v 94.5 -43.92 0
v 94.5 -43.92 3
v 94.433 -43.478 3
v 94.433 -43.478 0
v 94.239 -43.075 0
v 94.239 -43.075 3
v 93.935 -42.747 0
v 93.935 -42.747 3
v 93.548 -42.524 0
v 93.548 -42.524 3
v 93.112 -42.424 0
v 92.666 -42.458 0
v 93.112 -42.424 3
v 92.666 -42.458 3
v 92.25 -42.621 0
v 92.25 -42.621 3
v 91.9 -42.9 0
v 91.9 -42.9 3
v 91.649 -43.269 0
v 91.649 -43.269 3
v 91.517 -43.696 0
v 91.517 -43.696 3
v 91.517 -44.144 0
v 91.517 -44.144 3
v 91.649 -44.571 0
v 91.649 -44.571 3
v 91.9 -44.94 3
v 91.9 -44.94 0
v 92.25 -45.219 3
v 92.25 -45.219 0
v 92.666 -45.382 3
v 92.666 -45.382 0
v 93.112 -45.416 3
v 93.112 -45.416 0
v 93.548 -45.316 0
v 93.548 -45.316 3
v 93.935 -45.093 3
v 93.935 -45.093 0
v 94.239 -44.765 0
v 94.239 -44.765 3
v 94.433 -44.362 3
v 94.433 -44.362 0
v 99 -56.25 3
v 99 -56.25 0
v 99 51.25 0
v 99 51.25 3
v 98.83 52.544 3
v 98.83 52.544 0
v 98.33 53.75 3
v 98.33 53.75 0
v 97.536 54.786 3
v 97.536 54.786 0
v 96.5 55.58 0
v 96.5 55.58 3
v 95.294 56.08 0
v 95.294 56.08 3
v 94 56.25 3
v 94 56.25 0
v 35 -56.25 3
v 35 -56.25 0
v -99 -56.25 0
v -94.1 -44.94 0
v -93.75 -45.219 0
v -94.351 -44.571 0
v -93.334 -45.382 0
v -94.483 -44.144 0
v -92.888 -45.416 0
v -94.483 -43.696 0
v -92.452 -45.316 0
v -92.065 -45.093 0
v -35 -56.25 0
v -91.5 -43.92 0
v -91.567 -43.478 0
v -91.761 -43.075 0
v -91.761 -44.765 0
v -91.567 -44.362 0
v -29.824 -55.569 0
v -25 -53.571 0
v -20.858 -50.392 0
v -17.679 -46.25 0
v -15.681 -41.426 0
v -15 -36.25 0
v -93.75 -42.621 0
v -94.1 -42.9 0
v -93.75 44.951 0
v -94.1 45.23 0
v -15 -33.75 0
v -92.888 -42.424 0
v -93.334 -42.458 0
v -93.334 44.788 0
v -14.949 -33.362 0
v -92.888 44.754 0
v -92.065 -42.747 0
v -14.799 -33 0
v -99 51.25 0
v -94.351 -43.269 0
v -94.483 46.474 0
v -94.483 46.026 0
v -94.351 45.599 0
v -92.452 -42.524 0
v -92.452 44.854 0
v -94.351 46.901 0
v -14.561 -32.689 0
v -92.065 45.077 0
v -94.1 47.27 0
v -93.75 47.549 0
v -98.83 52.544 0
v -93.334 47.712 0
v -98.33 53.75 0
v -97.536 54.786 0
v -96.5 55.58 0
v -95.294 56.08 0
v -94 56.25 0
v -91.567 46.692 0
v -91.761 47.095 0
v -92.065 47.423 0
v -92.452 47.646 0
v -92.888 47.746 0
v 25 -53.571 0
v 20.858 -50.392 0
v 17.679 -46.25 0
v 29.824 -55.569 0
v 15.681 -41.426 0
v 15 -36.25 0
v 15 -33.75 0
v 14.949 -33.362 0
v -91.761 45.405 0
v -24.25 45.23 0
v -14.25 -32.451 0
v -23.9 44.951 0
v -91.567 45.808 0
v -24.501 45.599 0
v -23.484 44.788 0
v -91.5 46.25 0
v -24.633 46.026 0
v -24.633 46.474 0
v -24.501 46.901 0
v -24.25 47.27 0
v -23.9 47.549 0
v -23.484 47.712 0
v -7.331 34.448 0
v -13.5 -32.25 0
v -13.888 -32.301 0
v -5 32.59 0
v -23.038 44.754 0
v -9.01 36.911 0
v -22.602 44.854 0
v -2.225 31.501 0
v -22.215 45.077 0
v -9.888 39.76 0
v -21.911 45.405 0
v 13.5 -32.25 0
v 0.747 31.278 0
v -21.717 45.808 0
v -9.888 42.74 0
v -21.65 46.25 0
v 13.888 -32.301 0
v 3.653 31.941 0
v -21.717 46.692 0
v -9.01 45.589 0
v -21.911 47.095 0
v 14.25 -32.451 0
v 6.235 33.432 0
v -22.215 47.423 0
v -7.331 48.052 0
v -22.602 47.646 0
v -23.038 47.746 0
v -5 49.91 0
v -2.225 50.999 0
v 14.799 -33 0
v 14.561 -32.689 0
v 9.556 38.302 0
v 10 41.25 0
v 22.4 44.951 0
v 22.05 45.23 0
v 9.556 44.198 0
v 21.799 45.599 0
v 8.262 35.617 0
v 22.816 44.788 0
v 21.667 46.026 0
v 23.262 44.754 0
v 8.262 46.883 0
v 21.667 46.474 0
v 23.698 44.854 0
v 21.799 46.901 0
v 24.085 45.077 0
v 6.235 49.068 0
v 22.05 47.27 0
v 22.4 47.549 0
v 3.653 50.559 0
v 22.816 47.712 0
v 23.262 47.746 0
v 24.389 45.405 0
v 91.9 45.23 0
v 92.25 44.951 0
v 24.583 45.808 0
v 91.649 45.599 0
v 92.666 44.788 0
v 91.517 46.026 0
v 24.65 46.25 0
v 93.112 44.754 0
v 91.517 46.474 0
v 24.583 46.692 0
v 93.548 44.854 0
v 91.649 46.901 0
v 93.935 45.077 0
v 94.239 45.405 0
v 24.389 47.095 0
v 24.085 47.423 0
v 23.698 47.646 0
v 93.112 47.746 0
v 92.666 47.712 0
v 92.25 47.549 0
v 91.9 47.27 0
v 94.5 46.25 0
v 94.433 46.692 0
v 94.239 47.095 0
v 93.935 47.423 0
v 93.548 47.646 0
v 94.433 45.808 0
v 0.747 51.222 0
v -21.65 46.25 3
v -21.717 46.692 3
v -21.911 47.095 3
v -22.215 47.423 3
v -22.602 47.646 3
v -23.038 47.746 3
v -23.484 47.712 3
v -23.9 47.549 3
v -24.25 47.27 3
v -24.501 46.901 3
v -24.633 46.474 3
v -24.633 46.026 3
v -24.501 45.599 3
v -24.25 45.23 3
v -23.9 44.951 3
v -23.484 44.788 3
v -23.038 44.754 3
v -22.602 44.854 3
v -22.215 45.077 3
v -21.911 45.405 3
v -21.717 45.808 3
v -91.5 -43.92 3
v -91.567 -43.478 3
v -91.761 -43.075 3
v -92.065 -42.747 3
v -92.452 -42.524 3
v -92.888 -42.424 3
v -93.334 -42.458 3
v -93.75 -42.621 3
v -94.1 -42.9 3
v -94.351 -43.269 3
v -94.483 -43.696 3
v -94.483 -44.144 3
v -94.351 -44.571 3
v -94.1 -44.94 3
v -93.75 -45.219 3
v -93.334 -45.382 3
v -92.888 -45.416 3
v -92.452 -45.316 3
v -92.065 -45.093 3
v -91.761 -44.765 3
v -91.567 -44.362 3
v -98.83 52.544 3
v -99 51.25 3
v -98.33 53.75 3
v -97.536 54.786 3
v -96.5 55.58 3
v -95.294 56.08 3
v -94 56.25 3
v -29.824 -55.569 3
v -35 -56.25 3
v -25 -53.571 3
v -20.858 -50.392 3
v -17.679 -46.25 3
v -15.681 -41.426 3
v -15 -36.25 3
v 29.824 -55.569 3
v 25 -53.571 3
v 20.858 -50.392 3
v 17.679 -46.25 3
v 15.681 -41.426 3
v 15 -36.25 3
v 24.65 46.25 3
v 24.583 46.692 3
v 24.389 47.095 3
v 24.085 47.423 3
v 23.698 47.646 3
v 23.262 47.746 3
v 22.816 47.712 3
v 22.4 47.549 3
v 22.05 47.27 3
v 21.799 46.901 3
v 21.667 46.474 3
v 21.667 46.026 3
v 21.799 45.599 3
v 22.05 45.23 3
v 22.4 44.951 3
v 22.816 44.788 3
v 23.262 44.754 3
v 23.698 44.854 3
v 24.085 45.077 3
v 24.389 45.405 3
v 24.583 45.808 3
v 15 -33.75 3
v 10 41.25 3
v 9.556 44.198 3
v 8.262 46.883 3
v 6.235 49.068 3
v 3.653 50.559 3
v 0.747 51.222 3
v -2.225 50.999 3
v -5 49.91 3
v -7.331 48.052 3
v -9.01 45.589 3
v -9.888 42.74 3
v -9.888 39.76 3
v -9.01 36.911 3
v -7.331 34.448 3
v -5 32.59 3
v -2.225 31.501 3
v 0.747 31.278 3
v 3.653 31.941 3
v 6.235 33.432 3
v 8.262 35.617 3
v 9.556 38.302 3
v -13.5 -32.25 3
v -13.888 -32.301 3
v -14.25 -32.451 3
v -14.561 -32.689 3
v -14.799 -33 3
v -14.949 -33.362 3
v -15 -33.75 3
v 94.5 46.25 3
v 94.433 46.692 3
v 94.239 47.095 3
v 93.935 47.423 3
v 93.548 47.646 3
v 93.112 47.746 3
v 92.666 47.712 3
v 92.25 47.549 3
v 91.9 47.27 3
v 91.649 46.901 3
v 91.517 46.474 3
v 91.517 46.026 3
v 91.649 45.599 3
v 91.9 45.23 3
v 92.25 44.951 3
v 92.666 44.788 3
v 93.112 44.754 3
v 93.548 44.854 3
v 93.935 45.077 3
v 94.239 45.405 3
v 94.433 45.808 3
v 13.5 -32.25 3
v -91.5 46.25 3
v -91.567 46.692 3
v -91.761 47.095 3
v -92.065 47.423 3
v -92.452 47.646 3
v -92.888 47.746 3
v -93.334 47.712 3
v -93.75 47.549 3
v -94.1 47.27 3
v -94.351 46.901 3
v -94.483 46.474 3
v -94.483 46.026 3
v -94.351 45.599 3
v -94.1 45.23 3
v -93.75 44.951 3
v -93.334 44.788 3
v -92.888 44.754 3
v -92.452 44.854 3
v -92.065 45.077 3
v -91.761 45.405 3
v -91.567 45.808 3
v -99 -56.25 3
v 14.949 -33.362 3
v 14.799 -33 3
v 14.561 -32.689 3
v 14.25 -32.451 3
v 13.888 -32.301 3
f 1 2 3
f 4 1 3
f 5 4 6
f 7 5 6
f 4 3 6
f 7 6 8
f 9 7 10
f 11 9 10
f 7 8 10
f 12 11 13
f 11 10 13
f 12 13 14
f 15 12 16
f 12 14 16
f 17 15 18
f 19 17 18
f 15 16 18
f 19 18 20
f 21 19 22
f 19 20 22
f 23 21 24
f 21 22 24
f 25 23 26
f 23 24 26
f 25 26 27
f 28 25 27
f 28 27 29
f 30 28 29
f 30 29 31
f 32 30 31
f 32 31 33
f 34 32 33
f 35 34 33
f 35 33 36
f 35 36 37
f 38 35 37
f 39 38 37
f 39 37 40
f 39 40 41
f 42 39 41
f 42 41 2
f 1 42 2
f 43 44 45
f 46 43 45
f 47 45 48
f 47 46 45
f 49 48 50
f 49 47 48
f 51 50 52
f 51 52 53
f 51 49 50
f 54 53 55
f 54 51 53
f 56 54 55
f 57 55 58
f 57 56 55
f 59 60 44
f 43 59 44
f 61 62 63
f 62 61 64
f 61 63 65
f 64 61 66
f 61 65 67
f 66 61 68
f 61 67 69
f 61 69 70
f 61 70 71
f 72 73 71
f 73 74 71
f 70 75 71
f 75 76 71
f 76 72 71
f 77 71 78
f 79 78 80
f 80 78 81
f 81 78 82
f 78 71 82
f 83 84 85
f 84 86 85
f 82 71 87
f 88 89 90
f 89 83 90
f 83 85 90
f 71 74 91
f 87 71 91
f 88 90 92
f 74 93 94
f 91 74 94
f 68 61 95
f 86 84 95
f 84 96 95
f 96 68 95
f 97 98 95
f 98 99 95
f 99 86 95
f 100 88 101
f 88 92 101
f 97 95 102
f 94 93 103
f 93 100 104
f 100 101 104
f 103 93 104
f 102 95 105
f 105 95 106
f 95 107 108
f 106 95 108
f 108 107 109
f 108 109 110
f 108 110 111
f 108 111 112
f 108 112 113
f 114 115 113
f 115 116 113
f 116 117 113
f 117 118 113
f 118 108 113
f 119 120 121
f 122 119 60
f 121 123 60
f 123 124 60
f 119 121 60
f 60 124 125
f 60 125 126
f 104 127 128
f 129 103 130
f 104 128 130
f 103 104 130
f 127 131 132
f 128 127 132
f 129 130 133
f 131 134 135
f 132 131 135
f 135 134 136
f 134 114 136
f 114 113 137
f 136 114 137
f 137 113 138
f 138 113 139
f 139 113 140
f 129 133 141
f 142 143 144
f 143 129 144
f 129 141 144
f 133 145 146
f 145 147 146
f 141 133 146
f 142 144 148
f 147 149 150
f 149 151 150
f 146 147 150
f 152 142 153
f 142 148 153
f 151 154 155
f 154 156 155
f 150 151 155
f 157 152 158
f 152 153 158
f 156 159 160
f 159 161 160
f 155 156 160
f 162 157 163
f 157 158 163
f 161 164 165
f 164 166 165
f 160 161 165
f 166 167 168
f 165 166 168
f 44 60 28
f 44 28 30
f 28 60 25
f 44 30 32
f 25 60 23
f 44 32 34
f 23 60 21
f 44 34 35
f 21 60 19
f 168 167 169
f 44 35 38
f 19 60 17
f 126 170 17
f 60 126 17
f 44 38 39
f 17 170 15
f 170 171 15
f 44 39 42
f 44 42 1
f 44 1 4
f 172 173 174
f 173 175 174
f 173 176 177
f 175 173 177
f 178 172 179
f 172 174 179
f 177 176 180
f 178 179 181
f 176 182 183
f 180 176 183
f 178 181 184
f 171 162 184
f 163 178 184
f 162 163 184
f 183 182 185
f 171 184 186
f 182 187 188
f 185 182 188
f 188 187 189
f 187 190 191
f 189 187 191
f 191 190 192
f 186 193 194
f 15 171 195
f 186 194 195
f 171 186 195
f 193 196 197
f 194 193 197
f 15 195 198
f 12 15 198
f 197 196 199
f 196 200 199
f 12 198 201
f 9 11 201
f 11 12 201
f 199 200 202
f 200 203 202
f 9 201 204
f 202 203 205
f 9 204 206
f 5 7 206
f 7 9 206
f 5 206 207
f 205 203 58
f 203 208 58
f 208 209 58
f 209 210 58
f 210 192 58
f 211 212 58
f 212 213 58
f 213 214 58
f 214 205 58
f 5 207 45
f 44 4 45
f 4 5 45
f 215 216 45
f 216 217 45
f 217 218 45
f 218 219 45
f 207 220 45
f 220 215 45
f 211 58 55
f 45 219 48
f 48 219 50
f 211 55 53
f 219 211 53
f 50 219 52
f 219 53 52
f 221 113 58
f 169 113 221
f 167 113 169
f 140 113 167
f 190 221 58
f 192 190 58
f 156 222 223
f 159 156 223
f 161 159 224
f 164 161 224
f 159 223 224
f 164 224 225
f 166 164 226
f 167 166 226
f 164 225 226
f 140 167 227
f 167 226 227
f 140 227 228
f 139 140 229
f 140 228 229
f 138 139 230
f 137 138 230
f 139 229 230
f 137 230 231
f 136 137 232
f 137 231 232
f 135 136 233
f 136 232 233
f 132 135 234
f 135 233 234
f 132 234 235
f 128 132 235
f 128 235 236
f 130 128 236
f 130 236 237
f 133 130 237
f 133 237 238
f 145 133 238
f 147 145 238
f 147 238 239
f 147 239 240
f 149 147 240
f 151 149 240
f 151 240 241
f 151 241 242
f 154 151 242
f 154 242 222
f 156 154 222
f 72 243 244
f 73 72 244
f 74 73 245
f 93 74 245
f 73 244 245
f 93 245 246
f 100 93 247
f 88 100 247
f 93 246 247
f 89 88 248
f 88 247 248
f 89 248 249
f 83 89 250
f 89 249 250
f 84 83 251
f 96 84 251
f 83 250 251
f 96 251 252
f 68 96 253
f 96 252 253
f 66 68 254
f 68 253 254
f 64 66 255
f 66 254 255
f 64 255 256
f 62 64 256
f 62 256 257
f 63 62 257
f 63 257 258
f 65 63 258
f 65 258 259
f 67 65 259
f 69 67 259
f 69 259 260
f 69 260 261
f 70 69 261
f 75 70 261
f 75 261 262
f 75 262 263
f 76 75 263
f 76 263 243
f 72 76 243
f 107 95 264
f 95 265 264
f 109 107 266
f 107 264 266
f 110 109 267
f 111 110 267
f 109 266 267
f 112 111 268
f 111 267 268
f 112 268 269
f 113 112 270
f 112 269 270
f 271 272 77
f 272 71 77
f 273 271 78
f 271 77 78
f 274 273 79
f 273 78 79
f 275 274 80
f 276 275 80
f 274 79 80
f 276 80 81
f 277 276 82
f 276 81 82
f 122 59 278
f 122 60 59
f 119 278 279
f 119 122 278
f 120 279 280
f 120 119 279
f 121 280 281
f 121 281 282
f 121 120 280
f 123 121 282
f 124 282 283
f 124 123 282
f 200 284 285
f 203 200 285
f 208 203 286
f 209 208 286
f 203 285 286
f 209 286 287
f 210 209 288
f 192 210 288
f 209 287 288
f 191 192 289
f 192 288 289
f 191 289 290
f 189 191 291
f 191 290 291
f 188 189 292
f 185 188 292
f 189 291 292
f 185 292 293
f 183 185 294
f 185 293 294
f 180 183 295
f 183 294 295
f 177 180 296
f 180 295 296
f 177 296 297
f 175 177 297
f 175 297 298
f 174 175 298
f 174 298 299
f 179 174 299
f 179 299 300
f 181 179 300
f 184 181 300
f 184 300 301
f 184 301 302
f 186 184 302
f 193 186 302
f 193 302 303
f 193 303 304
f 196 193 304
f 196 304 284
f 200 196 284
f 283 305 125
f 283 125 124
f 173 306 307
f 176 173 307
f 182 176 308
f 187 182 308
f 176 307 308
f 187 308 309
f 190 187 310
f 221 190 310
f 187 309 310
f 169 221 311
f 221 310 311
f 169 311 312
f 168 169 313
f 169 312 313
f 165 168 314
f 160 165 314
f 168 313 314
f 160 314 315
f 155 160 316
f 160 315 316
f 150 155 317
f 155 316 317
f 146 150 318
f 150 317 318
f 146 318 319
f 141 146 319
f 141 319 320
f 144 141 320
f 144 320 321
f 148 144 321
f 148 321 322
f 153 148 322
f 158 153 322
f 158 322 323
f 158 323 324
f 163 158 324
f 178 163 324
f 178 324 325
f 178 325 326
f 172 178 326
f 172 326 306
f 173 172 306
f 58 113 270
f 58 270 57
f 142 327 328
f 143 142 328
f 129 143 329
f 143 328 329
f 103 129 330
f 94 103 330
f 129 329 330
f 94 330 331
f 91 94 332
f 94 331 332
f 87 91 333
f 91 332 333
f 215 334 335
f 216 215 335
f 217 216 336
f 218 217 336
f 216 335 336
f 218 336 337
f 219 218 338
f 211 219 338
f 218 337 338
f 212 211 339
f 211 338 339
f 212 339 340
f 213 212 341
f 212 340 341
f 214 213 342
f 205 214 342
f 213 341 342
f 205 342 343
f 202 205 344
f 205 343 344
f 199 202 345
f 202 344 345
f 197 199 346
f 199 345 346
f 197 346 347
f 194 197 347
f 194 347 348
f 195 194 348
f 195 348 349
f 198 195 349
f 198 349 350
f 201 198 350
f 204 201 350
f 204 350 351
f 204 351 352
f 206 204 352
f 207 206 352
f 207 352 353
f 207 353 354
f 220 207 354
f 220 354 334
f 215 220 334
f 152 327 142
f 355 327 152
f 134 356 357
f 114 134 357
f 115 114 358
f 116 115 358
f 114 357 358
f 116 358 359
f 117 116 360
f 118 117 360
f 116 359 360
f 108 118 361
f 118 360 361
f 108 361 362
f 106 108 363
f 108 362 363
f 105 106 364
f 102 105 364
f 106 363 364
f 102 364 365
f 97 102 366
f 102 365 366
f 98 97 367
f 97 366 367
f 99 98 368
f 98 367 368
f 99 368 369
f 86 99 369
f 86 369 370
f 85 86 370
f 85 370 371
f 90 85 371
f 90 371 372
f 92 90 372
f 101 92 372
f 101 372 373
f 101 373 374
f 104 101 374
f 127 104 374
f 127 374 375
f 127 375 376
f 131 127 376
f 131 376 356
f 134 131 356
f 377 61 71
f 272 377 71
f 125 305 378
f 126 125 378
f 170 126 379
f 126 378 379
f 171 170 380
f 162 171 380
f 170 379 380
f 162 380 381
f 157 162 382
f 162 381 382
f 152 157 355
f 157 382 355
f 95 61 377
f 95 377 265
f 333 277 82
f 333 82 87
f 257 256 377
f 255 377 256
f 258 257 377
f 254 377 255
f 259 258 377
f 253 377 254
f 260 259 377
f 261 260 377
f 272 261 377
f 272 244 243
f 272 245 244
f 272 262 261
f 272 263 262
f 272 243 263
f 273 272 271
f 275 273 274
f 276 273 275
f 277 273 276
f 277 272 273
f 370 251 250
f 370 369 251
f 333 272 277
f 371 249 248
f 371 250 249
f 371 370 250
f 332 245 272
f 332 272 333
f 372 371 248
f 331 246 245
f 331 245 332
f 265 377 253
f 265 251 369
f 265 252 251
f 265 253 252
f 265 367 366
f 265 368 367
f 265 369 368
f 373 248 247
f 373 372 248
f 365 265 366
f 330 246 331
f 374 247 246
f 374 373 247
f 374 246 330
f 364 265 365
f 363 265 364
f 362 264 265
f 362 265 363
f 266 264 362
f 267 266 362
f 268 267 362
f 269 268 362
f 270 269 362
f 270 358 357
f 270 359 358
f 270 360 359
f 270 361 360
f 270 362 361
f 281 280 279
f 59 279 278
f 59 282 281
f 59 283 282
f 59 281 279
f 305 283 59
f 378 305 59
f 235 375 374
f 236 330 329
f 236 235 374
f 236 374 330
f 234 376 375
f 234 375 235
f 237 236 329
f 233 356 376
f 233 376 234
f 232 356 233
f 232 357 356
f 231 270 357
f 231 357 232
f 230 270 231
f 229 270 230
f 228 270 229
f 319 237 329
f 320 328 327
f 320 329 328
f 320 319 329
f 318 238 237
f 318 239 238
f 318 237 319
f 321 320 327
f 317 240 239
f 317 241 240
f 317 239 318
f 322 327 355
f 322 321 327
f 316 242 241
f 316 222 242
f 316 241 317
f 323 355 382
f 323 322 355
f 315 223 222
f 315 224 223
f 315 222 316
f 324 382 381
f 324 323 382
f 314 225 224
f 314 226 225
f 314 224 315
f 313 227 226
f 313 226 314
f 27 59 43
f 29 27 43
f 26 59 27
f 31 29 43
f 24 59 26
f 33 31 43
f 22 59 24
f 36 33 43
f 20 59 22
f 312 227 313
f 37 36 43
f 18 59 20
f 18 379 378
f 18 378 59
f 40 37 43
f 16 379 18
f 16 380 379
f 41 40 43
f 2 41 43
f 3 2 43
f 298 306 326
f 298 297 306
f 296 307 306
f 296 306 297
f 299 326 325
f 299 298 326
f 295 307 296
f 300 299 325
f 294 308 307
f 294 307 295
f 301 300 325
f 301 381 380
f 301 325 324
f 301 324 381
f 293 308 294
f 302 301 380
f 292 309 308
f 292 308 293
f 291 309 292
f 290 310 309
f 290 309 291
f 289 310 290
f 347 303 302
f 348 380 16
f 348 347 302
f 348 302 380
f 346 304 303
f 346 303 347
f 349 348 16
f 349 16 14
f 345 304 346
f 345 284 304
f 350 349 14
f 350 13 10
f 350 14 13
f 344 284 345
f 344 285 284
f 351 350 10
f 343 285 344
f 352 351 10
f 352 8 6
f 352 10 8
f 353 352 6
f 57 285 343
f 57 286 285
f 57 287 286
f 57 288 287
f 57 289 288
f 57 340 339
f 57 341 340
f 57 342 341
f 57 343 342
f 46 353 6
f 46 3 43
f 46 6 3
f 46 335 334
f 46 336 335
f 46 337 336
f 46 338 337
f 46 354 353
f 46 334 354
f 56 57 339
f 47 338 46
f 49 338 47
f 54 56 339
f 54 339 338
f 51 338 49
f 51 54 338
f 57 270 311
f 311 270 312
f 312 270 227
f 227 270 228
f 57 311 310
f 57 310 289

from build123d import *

# Parameters (mm, degrees)
SKETCH_W      = 198
SKETCH_H      = 112.5
PAD_DEPTH     = 3
FILLET_R      = 5
SKETCH001_R   = 1.5
SKETCH001_R_2 = 10
POCKET_DEPTH  = 3.001
FILLET001_R   = 20


with BuildPart() as part:
    # Sketch → Pad (new body)
    with BuildSketch(Plane.XY):
        Rectangle(SKETCH_W, SKETCH_H)
    extrude(amount=PAD_DEPTH)

    # Fillet
    fillet_edges = [part.edges().sort_by_distance(p)[0] for p in [
        (-99, 56.25, 1.5),
        (99, 56.25, 1.5),
    ]]
    fillet(fillet_edges, radius=FILLET_R)

    # Sketch001 (on Face5 of Fillet) → Pocket (cut, through all)
    with BuildSketch(Plane.XY.offset(3)):
        with Locations((-93, 46.25)):
            Circle(SKETCH001_R)
        with Locations((-93, -43.92)):
            Circle(SKETCH001_R)
        with Locations((93, 46.25)):
            Circle(SKETCH001_R)
        with Locations((93, -43.92)):
            Circle(SKETCH001_R)
        with Locations((-23.15, 46.25)):
            Circle(SKETCH001_R)
        with Locations((23.15, 46.25)):
            Circle(SKETCH001_R)
        with Locations((0, 41.25)):
            Circle(SKETCH001_R_2)
        with BuildLine():
            Line((-13.5, -32.25), (13.5, -32.25))
            ThreePointArc((15, -33.75), (14.56066, -32.68934), (13.5, -32.25))
            Line((15, -33.75), (15, -56.25))
            Line((15, -56.25), (-15, -56.25))
            Line((-15, -56.25), (-15, -33.75))
            ThreePointArc((-13.5, -32.25), (-14.56066, -32.68934), (-15, -33.75))
        make_face()
    extrude(amount=-POCKET_DEPTH, mode=Mode.SUBTRACT)

    # Fillet001
    fillet001_edges = [part.edges().sort_by_distance(p)[0] for p in [
        (-15, -56.25, 1.5),
        (15, -56.25, 1.5),
    ]]
    fillet(fillet001_edges, radius=FILLET001_R)


solid = part.part
